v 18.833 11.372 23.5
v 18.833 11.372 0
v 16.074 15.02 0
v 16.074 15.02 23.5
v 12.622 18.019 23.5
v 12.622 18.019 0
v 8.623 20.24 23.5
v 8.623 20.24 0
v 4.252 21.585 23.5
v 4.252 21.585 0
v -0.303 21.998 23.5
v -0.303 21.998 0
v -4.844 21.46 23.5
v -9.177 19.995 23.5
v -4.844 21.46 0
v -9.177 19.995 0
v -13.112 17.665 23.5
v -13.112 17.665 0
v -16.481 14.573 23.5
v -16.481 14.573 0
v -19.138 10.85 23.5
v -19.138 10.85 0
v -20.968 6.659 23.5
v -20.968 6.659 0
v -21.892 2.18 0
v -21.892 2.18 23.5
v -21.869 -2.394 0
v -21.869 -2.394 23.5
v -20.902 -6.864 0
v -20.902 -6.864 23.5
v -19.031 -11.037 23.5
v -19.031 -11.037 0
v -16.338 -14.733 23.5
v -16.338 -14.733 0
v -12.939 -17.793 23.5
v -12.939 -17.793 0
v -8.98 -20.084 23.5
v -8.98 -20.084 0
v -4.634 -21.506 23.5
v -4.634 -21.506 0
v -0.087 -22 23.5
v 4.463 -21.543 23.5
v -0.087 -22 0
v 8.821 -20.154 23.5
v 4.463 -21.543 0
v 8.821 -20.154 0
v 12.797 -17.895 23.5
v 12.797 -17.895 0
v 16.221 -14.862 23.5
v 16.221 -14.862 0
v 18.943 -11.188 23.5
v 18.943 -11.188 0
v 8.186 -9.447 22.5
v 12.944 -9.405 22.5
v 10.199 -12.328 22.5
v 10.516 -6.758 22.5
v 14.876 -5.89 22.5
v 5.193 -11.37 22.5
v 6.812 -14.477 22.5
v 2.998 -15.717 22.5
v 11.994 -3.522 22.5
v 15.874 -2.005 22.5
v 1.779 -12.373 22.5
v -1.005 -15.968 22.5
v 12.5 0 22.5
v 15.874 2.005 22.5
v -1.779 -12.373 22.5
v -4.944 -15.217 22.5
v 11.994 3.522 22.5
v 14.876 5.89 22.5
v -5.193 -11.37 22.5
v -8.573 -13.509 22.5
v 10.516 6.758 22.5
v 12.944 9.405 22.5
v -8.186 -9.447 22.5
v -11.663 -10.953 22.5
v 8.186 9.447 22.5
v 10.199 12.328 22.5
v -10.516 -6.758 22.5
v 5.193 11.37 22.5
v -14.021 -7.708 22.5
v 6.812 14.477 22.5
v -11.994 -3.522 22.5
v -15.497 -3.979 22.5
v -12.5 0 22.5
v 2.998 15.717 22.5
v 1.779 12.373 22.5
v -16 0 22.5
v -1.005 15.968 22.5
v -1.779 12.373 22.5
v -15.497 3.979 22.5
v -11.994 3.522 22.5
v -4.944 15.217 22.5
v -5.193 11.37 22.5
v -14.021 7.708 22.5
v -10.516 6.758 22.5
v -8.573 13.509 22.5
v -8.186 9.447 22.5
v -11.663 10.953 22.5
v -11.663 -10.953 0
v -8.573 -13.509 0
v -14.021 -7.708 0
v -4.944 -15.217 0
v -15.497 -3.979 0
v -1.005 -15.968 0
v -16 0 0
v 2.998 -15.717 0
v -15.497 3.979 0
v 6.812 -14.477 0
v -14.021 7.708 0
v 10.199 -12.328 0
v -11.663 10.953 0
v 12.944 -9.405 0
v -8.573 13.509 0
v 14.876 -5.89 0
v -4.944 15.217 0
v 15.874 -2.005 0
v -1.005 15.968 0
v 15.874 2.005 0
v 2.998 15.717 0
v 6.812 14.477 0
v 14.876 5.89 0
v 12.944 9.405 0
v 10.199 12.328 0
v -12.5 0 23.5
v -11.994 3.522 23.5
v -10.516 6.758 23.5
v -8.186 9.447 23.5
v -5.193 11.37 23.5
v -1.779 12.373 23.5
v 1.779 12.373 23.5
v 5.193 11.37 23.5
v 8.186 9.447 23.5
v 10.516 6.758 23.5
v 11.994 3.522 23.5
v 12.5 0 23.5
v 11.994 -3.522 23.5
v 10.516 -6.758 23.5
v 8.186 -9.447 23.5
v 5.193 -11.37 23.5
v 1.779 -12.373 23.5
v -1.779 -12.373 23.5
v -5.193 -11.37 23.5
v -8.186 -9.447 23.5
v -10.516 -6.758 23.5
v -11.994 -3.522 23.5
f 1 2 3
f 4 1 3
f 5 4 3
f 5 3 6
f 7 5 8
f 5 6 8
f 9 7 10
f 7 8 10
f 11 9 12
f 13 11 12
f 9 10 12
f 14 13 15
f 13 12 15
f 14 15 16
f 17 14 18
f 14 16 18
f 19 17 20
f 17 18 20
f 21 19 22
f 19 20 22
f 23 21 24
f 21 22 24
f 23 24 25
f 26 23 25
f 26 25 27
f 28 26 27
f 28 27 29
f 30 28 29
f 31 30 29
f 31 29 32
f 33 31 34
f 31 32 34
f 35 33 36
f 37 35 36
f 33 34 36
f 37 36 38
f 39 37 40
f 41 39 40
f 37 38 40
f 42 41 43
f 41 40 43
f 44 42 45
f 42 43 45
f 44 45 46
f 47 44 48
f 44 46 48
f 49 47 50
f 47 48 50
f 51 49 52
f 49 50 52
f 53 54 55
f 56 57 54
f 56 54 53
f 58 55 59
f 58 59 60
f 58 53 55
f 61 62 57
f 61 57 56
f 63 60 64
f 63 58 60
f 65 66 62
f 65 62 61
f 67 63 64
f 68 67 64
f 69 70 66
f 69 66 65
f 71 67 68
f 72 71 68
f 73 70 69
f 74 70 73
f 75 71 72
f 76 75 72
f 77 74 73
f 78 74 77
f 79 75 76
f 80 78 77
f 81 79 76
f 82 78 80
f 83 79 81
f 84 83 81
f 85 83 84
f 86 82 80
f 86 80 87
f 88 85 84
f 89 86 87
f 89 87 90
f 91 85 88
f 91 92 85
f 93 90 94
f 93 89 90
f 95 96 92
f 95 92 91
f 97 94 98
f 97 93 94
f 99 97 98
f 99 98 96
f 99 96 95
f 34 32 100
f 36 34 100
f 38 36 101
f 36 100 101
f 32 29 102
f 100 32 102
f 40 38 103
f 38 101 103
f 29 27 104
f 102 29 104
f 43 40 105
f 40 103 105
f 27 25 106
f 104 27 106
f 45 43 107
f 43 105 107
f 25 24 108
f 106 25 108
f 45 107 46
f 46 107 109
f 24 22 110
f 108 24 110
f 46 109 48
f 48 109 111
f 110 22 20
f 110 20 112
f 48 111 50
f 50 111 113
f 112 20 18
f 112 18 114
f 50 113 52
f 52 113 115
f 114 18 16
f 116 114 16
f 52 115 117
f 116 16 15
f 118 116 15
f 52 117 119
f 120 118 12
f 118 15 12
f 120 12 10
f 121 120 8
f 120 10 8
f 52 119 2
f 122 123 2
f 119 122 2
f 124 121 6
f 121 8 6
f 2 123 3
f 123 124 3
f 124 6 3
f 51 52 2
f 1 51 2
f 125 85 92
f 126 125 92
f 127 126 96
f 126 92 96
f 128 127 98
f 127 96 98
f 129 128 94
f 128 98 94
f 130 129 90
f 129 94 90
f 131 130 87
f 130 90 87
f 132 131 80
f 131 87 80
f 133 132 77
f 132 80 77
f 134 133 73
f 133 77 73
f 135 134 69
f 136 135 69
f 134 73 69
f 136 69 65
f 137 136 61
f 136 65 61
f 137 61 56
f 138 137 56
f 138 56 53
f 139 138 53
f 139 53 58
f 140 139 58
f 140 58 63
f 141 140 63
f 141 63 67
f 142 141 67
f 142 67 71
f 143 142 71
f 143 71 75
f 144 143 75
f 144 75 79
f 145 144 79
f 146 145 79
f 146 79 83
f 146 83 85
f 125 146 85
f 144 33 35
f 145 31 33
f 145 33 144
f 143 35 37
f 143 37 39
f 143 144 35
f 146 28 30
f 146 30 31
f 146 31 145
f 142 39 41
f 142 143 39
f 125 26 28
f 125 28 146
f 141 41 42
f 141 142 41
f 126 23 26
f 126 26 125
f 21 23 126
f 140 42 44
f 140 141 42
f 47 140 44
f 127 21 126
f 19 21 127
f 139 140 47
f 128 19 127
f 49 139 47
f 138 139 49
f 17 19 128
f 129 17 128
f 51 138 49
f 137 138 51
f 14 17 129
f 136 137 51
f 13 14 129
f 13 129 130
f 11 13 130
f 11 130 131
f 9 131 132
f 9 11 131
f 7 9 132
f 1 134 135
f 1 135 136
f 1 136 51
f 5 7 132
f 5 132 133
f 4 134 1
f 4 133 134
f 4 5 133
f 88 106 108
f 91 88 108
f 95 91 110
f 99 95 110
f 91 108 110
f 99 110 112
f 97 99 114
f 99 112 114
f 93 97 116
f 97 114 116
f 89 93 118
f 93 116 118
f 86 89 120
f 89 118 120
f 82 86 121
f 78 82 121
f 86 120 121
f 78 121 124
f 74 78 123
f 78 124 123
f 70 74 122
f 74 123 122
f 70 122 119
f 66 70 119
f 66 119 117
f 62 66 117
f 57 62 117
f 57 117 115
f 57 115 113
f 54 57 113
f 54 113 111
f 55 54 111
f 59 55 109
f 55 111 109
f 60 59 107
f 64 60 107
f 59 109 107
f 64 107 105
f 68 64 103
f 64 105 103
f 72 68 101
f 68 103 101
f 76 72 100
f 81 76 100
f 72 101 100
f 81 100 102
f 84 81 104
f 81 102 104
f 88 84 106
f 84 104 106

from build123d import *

# Parameters (mm, degrees)
EXTRUDE_1_DEPTH     = 23.5
SKETCH_6_R          = 16
CUT_EXTRUDE_8_DEPTH = 22.5
SKETCH_7_R          = 12.5
CUT_EXTRUDE_9_DEPTH = 2


with BuildPart() as part:
    # Эскиз1 → Вытянуть1 (new body)
    with BuildSketch(Plane.XY):
        with BuildLine():
            Line((18.943049375, -11.187532363), (18.832657697, 11.372378998))
            ThreePointArc((18.832657697, 11.372378998), (-21.99973662, -0.107650593), (18.943049375, -11.187532363))
        make_face()
    extrude(amount=EXTRUDE_1_DEPTH)

    # Эскиз6 → Вытянуть8 (cut)
    with BuildSketch(Plane(origin=(0, 0, 0), x_dir=(-1, 0, 0), z_dir=(0, 0, -1))):
        Circle(SKETCH_6_R)
    extrude(amount=-CUT_EXTRUDE_8_DEPTH, mode=Mode.SUBTRACT)

    # Эскиз7 → Вытянуть9 (cut, through all)
    with BuildSketch(Plane(origin=(0, 0, 22.5), x_dir=(-1, 0, 0), z_dir=(0, 0, -1))):
        Circle(SKETCH_7_R)
    extrude(amount=-CUT_EXTRUDE_9_DEPTH, mode=Mode.SUBTRACT)


solid = part.part
